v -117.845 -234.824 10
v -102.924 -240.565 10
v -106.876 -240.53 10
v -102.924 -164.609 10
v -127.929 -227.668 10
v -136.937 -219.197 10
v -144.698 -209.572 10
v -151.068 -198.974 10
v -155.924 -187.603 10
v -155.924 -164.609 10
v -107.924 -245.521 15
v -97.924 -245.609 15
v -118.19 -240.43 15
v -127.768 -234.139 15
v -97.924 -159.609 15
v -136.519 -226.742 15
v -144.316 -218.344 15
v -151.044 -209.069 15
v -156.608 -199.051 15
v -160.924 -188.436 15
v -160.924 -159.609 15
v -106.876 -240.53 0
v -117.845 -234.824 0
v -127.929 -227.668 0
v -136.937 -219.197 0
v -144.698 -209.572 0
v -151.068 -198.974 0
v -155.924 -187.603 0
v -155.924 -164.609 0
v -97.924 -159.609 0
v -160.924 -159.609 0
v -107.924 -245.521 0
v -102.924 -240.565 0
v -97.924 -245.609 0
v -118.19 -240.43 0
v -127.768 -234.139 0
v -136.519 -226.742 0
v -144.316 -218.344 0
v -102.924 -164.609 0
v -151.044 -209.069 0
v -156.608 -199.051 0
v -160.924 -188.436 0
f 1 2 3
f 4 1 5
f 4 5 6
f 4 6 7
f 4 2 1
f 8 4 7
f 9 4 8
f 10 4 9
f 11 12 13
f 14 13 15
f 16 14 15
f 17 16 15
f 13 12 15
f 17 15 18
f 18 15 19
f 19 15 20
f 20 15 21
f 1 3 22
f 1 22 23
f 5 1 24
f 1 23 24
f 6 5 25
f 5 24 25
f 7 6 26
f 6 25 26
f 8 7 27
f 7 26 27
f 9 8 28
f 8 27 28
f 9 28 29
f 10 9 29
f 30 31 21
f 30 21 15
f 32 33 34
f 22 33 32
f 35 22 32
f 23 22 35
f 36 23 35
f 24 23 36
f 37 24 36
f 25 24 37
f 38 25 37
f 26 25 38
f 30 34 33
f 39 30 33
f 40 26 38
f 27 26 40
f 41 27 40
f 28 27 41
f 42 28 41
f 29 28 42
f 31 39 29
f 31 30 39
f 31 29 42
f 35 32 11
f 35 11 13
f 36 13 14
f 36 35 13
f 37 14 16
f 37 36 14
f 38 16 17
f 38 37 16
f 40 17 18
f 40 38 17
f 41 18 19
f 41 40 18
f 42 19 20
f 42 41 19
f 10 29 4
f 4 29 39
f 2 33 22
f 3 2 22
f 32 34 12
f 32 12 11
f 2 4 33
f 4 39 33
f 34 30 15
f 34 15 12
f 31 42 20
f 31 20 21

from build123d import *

# Parameters (mm, degrees)
BOSS_EXTRUDE1_DEPTH = 15
SHELL1_T            = -5


with BuildPart() as part:
    # Sketch1 → Boss-Extrude1 (new body)
    with BuildSketch(Plane.XY):
        with BuildLine():
            Line((-97.924180929, -245.60870674), (-107.924180929, -245.521090808))
            ThreePointArc((-107.924180929, -245.521090808), (-140.543987168, -222.66060862), (-160.924180929, -188.436332043))
            Line((-160.924180929, -188.436332043), (-160.924180929, -159.60870674))
            Line((-160.924180929, -159.60870674), (-97.924180929, -159.60870674))
            Line((-97.924180929, -159.60870674), (-97.924180929, -245.60870674))
        make_face()
    extrude(amount=BOSS_EXTRUDE1_DEPTH)

    # Shell1
    shell1_openings = [part.faces().sort_by_distance(p)[0] for p in [
        (-125.349491383, -195.90901573, 0),
    ]]
    offset(amount=SHELL1_T, openings=shell1_openings, kind=Kind.INTERSECTION)


solid = part.part
